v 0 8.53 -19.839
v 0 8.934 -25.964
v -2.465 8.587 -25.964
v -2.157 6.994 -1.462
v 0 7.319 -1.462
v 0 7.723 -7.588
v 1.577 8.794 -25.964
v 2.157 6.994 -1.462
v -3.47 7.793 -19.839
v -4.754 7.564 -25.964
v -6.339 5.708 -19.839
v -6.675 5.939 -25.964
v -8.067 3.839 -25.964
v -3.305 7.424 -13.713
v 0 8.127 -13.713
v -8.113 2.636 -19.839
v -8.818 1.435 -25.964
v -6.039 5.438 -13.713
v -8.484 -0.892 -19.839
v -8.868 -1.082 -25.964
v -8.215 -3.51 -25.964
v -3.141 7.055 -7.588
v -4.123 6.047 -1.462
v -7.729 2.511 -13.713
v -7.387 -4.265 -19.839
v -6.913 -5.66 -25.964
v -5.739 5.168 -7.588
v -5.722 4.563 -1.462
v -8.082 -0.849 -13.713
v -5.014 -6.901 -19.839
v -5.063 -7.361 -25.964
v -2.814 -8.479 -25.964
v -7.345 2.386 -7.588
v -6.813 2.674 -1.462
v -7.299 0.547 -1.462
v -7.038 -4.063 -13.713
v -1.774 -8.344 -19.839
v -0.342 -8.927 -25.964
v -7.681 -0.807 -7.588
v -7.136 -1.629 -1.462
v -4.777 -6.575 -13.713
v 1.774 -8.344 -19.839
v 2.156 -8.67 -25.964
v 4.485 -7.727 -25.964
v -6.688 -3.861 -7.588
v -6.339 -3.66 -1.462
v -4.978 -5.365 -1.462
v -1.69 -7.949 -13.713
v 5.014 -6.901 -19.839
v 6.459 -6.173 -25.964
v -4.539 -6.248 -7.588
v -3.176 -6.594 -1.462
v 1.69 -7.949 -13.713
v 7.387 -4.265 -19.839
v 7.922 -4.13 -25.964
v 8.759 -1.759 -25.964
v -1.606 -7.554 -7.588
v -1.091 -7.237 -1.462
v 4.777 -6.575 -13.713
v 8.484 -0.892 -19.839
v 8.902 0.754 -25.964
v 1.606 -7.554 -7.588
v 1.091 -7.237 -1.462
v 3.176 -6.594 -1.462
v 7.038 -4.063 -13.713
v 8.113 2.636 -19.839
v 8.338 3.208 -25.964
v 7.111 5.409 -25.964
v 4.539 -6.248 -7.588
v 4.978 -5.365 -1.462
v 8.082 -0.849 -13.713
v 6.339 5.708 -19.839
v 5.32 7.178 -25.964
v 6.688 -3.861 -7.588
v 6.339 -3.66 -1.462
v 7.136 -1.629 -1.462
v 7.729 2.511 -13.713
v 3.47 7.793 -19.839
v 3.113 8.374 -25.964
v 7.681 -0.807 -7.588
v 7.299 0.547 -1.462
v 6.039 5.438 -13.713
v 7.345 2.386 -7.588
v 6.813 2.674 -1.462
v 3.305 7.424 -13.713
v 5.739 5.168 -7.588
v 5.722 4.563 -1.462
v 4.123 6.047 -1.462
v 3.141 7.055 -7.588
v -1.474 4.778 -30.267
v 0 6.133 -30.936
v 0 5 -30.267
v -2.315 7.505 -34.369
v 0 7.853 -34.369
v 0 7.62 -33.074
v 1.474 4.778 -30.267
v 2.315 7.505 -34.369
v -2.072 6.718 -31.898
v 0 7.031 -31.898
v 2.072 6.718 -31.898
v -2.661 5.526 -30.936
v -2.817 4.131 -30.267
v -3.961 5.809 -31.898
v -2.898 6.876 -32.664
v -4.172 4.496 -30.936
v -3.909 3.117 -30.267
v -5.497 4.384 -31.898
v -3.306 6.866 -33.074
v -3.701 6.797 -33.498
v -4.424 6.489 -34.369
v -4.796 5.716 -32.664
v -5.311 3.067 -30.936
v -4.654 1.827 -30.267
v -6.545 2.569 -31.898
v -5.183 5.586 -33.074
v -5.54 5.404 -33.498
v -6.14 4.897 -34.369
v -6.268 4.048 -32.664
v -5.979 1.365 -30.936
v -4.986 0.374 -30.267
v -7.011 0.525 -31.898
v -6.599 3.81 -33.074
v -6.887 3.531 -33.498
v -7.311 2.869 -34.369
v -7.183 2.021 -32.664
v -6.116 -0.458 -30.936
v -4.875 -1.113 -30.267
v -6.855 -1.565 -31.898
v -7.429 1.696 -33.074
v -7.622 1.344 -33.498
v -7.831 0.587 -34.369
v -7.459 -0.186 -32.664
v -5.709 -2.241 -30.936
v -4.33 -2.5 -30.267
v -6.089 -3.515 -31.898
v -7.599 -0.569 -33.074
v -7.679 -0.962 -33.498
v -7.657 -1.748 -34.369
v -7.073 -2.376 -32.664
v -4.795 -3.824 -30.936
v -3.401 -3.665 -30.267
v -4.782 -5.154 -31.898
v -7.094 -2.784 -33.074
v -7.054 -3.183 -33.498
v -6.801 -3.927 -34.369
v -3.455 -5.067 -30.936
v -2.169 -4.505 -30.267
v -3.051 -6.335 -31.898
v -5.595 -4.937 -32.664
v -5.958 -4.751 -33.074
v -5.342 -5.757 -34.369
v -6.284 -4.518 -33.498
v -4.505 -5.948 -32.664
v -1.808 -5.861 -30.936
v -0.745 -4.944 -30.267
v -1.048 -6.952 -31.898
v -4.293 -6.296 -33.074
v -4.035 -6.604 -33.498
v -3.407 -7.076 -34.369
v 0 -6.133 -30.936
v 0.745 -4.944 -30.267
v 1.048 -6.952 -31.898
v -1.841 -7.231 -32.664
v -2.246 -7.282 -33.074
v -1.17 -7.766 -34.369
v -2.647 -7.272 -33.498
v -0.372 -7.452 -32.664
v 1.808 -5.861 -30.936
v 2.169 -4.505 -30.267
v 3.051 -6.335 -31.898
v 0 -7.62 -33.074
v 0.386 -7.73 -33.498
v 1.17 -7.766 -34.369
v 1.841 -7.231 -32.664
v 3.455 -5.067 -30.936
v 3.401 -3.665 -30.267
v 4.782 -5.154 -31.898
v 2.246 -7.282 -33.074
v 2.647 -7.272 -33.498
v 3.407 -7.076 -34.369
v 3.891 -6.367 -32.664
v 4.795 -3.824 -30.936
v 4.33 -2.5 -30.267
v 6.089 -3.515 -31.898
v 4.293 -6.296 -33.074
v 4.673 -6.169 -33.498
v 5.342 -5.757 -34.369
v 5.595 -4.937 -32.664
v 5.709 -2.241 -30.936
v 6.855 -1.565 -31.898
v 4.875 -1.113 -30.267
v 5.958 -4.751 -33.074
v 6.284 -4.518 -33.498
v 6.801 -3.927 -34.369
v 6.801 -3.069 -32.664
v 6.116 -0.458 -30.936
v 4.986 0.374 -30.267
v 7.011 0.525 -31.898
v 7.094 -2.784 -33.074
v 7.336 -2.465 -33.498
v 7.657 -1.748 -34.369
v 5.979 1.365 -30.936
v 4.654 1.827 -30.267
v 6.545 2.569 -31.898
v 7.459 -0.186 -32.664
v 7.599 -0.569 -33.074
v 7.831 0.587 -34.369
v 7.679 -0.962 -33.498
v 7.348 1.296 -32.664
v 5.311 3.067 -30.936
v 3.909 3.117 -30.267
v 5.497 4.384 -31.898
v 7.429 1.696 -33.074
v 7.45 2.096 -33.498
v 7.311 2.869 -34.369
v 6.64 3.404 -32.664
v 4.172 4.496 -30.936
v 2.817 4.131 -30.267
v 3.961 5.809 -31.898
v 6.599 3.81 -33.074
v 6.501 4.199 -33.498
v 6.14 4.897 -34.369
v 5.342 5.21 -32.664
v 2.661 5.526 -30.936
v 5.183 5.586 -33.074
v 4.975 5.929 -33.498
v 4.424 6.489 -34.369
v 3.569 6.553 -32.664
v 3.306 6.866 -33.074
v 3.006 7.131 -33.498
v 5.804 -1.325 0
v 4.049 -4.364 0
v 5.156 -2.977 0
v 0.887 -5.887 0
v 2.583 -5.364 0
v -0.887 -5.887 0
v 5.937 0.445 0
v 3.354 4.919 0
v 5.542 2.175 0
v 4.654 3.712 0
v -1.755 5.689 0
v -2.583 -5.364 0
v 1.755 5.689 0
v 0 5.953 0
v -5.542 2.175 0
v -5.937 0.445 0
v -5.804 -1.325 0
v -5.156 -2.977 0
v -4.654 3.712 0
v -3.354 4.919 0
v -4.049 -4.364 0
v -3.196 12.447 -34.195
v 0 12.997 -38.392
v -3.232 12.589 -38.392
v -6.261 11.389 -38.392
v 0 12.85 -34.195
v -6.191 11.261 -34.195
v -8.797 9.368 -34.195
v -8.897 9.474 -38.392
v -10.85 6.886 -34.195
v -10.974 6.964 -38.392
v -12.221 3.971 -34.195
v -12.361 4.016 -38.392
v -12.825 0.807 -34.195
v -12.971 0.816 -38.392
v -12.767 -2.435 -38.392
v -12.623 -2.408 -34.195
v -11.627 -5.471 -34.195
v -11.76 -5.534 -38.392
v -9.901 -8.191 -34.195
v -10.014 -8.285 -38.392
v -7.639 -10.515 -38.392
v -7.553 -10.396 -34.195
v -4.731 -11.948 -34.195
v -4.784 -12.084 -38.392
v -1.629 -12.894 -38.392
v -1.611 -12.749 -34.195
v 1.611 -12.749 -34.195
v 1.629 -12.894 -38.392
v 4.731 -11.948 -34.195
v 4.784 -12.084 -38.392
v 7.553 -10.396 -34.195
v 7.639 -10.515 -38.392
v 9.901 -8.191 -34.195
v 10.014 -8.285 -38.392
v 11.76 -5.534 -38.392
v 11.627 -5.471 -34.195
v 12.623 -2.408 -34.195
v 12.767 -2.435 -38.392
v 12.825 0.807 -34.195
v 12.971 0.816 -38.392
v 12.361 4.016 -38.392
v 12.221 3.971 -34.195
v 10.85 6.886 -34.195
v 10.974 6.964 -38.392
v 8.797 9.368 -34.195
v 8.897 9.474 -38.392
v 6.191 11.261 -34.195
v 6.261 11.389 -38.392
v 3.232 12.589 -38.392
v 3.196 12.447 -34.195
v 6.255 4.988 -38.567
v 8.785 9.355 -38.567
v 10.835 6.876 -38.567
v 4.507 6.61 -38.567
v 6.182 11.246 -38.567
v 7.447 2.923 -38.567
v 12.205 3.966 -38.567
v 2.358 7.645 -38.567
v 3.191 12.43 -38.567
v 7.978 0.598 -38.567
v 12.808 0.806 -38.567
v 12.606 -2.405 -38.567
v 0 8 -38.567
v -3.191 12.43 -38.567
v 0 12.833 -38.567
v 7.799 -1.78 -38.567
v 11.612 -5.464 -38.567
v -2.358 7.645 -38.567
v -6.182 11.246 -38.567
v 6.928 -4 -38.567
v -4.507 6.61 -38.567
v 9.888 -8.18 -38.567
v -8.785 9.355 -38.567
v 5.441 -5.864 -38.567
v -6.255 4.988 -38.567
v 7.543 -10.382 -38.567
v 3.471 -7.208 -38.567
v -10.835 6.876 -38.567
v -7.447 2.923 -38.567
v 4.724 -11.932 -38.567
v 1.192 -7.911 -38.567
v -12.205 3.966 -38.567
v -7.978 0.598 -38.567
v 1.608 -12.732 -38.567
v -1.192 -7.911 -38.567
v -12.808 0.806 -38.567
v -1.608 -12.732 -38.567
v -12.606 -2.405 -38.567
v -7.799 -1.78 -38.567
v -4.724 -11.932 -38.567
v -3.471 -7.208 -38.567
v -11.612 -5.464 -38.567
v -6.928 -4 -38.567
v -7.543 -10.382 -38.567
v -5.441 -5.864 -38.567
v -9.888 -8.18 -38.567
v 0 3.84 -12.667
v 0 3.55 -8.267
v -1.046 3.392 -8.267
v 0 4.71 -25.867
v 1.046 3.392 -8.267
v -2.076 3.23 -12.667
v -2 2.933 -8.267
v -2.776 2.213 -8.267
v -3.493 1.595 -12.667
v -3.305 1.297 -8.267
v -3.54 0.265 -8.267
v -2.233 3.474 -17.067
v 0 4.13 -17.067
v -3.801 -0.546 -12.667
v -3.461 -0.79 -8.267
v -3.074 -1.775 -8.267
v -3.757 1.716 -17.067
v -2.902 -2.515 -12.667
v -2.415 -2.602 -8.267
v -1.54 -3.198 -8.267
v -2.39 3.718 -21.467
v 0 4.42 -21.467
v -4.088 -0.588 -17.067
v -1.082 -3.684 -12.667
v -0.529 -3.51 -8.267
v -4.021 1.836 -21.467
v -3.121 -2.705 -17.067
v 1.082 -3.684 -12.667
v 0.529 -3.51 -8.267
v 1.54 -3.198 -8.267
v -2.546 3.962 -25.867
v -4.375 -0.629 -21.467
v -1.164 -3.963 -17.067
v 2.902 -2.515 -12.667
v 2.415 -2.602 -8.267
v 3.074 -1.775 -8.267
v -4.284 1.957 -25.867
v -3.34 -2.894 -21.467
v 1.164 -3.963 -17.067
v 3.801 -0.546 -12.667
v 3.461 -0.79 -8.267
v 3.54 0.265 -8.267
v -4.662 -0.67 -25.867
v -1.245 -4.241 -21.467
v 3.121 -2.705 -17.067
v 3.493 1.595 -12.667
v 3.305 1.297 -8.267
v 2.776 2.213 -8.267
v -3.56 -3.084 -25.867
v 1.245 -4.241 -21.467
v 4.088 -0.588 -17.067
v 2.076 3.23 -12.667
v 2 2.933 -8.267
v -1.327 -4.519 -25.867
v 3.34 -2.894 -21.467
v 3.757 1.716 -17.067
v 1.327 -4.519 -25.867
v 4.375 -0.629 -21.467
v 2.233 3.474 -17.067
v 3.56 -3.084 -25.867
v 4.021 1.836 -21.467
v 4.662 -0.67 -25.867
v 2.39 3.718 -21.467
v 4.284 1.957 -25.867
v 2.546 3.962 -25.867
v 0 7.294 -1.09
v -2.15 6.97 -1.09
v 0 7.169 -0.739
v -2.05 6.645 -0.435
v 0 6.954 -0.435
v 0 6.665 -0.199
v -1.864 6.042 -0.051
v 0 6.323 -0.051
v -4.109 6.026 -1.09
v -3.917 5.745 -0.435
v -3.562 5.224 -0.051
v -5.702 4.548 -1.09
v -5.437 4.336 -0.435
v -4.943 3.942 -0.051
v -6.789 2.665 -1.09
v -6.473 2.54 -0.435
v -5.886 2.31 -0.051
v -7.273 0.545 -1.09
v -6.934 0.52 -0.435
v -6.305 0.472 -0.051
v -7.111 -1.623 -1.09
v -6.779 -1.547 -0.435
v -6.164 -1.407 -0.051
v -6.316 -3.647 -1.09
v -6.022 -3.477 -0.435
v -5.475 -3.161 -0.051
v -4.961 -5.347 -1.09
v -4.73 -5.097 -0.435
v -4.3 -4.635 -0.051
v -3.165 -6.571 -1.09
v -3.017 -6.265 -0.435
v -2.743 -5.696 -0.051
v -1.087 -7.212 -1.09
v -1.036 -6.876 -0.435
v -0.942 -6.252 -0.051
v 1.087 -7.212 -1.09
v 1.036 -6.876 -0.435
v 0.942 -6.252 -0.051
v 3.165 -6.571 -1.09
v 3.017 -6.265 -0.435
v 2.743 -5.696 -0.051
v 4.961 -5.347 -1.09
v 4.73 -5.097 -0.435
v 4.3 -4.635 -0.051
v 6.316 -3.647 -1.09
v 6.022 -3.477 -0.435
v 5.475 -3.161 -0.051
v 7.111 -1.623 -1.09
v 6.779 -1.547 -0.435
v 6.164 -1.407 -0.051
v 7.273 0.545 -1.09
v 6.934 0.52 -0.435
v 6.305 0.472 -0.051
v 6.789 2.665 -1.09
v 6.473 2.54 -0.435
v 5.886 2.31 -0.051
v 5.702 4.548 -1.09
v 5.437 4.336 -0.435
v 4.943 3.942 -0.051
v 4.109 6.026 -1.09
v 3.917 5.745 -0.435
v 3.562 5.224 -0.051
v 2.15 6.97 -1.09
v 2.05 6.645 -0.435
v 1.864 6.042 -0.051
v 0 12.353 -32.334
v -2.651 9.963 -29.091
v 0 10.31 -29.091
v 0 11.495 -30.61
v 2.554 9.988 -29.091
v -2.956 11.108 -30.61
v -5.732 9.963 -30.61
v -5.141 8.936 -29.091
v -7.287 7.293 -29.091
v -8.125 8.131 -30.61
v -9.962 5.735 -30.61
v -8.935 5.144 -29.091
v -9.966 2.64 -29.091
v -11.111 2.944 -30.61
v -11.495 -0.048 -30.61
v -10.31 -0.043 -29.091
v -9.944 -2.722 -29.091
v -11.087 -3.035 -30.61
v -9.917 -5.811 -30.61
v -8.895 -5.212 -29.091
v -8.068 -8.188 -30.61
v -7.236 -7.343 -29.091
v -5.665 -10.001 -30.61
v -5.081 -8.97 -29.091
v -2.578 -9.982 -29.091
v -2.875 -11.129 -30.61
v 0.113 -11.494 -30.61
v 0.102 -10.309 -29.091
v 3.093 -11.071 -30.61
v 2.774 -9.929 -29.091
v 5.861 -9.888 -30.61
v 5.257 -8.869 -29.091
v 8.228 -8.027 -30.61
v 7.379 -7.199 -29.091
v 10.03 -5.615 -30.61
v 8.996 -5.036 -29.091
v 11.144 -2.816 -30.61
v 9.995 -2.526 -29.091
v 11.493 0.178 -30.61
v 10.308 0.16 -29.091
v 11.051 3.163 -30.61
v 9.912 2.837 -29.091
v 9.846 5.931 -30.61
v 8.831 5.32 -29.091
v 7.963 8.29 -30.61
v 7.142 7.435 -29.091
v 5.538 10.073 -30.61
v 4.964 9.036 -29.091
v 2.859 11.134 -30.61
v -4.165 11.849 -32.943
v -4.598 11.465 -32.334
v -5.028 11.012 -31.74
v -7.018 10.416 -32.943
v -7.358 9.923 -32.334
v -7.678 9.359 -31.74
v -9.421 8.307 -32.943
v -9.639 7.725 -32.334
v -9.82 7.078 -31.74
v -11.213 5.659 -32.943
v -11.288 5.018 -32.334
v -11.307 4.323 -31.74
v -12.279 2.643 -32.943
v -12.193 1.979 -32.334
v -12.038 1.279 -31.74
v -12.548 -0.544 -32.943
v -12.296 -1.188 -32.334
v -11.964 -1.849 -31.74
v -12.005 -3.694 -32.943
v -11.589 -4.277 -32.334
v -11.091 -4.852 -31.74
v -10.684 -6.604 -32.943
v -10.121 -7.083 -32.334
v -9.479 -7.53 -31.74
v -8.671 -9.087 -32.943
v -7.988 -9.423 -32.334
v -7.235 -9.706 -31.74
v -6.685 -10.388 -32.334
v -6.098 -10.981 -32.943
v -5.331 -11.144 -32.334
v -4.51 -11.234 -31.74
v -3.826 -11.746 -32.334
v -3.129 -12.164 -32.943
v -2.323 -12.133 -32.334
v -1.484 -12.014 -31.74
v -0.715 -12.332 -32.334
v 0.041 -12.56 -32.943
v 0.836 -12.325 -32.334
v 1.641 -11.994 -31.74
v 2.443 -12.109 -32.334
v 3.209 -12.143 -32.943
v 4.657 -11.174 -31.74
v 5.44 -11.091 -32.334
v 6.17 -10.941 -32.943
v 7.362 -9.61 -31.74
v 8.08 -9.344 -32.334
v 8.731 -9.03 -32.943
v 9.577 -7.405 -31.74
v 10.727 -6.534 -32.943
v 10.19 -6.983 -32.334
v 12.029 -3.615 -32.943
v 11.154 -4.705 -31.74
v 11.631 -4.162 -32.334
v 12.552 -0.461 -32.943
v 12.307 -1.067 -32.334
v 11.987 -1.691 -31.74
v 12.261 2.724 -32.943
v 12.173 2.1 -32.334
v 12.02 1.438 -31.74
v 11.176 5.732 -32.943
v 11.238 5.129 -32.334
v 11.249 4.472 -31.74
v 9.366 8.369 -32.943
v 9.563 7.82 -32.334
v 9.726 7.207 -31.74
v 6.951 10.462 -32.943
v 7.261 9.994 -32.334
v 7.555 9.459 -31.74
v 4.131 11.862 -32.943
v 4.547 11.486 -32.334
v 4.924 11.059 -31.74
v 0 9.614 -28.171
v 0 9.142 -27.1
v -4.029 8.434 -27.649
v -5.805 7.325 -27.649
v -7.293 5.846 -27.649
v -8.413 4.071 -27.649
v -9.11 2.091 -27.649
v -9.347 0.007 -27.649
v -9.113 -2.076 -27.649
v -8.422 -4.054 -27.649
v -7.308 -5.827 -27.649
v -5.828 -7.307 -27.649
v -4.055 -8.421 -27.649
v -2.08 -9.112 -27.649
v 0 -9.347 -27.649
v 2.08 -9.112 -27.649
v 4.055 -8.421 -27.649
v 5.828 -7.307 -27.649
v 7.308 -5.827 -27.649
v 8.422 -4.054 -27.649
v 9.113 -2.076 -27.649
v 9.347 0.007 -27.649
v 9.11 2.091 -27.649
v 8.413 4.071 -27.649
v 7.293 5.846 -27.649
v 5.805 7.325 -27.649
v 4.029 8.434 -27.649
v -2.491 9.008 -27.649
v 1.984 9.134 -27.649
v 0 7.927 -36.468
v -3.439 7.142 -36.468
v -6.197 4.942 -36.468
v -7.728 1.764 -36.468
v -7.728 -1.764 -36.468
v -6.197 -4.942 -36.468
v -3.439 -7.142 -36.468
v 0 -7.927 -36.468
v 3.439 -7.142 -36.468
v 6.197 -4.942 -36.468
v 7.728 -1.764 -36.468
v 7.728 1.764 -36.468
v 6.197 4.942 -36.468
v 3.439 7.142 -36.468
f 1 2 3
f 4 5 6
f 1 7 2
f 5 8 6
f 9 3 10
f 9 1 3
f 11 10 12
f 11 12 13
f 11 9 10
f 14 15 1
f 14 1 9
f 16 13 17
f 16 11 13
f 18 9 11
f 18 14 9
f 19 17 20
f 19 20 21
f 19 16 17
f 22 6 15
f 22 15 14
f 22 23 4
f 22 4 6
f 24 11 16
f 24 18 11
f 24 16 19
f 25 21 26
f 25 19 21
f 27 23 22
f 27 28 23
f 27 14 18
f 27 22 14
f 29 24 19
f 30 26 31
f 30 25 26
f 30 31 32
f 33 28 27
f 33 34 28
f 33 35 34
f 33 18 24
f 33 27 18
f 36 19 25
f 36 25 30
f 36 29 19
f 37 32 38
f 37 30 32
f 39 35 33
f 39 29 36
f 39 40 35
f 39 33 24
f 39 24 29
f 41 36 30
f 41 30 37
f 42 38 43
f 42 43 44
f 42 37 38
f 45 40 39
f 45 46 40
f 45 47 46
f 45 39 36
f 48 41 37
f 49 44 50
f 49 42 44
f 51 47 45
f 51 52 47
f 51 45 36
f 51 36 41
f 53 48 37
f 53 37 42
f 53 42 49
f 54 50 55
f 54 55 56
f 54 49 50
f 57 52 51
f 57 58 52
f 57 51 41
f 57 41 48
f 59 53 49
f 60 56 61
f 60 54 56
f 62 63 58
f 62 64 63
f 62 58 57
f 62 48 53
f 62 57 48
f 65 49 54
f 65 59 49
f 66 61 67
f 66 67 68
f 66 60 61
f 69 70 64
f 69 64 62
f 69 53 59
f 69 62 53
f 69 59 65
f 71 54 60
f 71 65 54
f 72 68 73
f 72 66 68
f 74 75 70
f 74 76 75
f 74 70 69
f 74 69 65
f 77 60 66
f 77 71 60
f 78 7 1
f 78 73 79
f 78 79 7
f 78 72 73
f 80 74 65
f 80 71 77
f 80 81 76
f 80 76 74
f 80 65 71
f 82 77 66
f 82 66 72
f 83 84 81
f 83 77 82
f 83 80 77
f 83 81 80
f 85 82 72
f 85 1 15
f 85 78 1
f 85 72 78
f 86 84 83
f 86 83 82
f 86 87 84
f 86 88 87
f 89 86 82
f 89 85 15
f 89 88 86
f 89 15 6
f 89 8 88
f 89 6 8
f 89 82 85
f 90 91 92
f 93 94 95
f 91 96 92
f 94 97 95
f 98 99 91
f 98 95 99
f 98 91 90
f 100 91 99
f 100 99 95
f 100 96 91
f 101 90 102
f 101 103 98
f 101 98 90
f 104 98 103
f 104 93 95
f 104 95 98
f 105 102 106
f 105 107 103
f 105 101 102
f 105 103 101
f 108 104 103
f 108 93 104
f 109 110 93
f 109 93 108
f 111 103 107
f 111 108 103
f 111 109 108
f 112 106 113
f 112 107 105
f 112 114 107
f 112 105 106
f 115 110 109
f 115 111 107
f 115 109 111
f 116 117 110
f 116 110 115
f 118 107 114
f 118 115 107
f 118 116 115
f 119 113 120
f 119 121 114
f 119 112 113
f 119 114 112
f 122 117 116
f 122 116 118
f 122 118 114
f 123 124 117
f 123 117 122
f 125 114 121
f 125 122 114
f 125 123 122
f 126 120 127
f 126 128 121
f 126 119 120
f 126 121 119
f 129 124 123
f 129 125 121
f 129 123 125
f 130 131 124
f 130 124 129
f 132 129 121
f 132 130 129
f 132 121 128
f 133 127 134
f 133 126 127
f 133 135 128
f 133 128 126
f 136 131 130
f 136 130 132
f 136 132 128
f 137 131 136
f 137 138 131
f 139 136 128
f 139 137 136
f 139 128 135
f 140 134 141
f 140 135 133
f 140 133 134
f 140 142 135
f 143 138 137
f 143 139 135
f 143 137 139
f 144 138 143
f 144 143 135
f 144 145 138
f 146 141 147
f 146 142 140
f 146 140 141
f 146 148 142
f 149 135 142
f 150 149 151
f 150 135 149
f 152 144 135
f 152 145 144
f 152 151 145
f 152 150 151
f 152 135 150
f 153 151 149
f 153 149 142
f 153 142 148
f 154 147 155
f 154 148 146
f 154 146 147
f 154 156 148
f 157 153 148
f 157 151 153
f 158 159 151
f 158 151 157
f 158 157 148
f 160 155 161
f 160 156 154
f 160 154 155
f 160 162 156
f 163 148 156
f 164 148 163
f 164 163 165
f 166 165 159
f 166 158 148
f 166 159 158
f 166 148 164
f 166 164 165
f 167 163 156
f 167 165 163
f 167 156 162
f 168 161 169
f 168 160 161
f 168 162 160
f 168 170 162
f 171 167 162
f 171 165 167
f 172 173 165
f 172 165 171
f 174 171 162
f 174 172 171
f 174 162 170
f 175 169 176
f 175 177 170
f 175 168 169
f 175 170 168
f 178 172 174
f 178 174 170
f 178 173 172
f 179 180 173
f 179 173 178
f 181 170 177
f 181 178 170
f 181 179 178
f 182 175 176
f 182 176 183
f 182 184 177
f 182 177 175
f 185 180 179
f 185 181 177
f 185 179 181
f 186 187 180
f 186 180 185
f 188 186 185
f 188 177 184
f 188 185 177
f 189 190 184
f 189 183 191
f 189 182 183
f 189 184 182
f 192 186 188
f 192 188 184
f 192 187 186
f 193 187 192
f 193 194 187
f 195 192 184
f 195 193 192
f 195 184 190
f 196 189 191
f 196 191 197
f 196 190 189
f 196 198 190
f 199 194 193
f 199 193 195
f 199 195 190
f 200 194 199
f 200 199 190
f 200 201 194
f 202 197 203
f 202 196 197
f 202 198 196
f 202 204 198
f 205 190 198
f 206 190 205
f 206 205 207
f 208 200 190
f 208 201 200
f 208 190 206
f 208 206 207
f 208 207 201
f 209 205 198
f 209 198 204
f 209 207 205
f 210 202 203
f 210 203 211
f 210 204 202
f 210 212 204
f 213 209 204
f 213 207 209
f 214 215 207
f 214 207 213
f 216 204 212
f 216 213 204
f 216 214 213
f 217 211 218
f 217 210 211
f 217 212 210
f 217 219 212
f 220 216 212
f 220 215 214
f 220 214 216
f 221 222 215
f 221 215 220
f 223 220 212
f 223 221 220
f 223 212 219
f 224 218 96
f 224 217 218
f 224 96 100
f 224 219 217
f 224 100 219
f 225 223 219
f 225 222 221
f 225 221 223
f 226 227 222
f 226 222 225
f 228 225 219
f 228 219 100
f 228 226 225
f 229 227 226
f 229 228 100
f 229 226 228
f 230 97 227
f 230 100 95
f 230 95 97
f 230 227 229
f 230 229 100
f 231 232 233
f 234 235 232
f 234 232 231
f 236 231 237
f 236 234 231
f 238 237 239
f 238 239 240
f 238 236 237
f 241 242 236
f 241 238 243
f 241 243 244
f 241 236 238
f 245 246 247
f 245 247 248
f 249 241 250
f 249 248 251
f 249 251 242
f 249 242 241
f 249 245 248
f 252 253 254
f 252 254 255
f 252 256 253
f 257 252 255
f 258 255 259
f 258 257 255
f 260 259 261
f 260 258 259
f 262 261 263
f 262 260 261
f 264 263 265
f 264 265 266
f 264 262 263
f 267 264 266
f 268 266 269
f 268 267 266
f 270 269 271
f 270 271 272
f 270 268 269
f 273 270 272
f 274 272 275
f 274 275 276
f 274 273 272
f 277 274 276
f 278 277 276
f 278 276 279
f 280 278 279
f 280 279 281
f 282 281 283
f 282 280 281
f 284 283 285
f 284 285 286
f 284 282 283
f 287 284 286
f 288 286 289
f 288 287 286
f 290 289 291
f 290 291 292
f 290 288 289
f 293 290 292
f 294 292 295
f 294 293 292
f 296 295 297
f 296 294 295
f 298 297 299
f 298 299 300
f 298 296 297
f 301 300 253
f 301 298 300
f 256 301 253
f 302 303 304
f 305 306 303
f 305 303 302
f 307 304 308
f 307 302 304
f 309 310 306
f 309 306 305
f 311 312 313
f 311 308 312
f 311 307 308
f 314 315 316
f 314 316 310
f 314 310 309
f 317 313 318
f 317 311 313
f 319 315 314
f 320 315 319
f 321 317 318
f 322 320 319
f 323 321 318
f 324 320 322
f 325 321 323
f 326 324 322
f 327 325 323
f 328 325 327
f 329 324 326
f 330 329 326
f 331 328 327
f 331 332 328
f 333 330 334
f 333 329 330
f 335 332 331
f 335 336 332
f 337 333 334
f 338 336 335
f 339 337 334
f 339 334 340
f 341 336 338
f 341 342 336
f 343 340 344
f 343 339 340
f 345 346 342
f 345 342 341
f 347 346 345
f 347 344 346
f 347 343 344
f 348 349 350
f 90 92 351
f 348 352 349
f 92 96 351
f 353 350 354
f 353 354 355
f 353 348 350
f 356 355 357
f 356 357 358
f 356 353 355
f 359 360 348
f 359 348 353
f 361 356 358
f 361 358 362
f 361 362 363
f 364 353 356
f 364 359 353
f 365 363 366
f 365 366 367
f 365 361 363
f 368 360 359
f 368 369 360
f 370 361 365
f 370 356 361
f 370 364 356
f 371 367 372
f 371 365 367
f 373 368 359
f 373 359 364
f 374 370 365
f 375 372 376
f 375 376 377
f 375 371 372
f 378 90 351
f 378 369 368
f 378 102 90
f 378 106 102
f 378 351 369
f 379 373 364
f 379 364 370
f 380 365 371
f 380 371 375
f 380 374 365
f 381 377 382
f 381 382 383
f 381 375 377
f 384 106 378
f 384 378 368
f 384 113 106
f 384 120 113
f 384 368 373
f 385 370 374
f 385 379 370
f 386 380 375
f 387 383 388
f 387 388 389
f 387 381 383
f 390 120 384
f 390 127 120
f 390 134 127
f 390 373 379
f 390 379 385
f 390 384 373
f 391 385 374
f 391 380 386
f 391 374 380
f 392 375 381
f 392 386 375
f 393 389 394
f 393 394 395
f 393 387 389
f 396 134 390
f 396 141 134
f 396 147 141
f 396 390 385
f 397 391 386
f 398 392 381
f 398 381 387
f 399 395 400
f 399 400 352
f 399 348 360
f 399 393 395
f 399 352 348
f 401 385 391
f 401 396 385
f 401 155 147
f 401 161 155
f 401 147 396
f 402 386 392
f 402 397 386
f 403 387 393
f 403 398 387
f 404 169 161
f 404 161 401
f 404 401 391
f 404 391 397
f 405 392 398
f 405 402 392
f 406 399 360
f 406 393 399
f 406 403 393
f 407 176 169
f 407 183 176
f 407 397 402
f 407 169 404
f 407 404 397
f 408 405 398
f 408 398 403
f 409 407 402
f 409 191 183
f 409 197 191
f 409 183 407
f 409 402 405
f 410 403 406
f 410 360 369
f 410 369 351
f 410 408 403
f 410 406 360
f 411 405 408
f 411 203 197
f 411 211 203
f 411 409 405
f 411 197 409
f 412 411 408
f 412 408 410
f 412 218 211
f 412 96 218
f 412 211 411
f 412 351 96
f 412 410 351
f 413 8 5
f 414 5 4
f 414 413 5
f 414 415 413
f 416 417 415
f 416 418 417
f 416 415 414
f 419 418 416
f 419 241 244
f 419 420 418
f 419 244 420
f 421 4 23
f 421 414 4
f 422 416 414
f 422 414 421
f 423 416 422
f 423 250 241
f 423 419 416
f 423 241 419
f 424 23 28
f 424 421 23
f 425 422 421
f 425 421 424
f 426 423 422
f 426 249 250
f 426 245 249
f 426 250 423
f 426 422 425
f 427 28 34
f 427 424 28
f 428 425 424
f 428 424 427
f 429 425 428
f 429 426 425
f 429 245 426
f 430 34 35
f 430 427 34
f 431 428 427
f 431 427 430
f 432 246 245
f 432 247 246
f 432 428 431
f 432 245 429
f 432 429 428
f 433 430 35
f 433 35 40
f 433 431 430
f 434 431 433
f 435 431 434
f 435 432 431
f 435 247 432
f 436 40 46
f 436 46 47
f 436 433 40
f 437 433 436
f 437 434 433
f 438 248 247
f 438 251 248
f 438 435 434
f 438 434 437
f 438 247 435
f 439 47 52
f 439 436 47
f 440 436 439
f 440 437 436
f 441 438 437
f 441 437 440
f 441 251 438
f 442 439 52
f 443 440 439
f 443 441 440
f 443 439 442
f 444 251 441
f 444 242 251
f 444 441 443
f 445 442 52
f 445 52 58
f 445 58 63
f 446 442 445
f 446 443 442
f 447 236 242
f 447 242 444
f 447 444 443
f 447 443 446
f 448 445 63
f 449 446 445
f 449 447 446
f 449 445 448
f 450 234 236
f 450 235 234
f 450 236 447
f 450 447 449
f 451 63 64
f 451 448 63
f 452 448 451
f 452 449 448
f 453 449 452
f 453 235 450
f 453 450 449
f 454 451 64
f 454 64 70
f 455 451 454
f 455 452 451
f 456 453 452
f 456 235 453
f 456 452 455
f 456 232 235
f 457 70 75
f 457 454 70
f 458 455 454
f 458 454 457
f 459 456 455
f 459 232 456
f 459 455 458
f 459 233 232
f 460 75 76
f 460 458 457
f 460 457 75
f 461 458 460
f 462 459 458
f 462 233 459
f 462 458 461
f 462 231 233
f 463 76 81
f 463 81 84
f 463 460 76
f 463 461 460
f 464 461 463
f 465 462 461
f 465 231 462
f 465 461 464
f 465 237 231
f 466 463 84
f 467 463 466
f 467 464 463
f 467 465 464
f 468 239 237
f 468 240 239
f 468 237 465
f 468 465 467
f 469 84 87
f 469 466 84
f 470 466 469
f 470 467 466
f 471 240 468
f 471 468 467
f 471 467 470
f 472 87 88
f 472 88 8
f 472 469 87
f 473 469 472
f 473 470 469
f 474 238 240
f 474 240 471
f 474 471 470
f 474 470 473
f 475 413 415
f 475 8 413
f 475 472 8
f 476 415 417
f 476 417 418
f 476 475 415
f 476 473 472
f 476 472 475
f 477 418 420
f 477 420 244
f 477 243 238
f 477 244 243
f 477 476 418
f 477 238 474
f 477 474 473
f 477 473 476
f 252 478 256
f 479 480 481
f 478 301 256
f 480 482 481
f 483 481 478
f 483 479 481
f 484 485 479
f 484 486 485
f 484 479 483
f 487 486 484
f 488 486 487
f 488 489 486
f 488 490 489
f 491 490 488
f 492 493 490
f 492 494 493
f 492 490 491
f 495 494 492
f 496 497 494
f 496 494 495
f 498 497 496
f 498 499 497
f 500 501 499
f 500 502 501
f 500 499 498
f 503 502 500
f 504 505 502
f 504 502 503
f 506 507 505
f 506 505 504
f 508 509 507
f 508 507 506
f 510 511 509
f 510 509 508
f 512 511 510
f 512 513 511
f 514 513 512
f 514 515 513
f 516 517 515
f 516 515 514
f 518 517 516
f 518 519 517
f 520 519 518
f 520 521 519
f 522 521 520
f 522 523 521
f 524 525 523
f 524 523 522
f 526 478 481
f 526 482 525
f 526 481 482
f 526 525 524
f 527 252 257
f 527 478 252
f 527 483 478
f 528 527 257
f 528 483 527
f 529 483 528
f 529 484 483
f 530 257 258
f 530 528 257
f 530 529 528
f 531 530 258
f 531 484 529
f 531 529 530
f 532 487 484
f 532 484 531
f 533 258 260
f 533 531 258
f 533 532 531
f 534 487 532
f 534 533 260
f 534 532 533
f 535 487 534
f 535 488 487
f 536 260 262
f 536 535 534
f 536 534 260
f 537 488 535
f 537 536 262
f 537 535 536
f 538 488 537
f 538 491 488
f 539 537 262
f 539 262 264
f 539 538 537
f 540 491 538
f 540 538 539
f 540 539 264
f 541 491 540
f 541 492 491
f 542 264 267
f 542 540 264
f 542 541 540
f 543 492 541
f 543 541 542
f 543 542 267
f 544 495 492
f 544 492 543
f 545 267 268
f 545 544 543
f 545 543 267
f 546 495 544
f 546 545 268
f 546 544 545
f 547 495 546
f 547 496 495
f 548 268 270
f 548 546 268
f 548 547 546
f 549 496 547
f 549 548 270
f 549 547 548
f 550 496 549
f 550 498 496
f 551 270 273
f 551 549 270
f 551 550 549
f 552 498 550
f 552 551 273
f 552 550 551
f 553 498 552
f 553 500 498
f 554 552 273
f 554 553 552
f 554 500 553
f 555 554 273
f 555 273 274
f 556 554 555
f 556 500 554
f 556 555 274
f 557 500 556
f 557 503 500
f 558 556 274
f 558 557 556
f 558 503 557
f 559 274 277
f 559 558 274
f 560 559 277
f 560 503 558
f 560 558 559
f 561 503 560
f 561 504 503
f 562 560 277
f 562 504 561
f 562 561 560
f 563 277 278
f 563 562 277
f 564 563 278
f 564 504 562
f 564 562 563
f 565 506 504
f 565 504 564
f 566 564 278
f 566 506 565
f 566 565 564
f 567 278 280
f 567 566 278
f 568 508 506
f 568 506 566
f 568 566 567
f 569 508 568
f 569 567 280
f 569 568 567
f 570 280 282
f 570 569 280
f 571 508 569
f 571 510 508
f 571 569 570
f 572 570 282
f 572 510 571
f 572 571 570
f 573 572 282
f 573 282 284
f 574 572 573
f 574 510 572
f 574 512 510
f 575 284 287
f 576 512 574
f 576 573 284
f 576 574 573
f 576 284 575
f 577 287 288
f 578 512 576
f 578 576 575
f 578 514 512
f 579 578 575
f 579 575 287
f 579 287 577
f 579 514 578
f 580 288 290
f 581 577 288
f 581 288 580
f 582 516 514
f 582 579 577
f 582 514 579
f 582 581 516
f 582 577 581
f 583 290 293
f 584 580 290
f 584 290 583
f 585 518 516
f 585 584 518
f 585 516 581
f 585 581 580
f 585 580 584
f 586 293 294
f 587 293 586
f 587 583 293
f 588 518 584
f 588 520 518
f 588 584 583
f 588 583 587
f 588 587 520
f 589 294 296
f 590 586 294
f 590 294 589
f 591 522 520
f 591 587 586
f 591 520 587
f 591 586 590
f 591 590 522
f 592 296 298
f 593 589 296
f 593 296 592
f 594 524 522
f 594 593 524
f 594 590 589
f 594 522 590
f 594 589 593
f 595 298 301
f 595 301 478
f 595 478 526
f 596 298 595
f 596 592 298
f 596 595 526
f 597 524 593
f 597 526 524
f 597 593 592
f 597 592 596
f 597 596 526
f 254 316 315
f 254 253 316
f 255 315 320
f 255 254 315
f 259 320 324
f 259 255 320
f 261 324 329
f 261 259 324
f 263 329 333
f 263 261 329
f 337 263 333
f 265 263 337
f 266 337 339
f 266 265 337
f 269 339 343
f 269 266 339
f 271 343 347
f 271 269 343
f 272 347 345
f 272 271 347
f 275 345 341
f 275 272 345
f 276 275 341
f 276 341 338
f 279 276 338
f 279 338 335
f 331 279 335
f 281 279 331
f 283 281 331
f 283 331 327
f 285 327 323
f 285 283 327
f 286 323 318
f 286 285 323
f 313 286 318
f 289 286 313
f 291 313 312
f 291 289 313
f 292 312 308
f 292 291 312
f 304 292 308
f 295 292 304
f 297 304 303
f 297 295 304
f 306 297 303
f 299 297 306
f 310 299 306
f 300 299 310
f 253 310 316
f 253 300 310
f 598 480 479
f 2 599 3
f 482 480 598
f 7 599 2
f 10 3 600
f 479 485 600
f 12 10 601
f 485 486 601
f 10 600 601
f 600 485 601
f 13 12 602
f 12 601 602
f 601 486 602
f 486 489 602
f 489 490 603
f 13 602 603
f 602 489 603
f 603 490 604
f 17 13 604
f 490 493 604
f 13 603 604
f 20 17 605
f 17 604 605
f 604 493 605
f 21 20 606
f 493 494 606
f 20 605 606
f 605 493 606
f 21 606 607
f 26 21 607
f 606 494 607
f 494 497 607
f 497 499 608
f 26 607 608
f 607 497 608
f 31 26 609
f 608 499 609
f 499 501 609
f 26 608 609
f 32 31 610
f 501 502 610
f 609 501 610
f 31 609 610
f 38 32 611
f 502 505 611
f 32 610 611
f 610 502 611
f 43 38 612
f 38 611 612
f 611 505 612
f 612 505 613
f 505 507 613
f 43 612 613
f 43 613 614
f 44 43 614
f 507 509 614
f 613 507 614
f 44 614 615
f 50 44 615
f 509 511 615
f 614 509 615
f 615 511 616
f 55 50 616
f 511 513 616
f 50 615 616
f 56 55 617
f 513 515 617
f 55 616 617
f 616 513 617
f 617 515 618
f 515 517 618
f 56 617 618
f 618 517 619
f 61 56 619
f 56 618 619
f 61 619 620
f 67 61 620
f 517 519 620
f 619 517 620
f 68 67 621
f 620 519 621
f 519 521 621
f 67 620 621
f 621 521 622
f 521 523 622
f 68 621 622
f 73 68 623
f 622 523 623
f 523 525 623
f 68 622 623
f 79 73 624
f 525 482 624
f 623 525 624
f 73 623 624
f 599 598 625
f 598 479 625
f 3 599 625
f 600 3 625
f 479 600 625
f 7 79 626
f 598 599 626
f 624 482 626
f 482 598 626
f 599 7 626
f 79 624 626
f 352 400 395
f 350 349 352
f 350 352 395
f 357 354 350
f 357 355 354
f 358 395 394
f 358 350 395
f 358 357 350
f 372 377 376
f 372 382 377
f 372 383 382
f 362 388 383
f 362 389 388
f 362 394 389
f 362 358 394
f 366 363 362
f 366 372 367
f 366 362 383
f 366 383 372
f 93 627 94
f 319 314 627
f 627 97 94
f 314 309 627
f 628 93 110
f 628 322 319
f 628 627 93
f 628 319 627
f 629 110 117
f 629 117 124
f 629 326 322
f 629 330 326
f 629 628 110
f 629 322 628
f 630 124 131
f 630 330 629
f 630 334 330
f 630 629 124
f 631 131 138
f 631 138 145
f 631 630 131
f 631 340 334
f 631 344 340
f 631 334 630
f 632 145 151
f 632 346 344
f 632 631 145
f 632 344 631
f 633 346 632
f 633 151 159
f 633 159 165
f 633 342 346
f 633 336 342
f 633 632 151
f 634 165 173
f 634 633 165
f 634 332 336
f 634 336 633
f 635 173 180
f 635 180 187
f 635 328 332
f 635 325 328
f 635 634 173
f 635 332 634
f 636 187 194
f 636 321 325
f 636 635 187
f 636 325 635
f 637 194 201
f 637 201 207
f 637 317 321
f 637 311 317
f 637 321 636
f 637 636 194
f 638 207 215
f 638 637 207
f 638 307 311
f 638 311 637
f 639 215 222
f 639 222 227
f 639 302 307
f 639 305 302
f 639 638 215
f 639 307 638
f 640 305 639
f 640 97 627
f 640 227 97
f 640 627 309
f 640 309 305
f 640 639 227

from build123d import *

# Parameters (mm, degrees)
F2_R = 5


with BuildPart() as f1:
    # F0 (on Right) → F1 (revolve)
    with BuildSketch(Plane.YZ):
        with BuildLine():
            Line((8, -38.566649), (12.832926, -38.566649))
            Line((12.832926, -38.566649), (12.996954, -38.392151))
            Line((12.996954, -38.392151), (12.850376, -34.19471))
            ThreePointArc((12.850376, -34.19471), (11.566748, -30.726), (9.06815, -27.998977))
            Line((9.06815, -27.998977), (7.319139, -1.46226))
            ThreePointArc((7.319139, -1.46226), (6.953716, -0.434518), (5.953226, 0))
            Line((5.953226, 0), (0, 0))
            Line((0, 0), (0, -8.266649))
            Line((0, -8.266649), (3.55, -8.266649))
            Line((3.55, -8.266649), (5, -30.266649))
            ThreePointArc((5, -30.266649), (7.030814, -31.89776), (7.853422, -34.369207))
            Line((7.853422, -34.369207), (8, -38.566649))
        make_face()
    revolve(axis=Axis((0, 0, -4.133324), (0, 0, 1)))

    # F2
    f2_edges = [f1.edges().sort_by_distance(p)[0] for p in [
        (0, -9.06815, -27.998977),
    ]]
    fillet(f2_edges, radius=F2_R)


solid = f1.part
